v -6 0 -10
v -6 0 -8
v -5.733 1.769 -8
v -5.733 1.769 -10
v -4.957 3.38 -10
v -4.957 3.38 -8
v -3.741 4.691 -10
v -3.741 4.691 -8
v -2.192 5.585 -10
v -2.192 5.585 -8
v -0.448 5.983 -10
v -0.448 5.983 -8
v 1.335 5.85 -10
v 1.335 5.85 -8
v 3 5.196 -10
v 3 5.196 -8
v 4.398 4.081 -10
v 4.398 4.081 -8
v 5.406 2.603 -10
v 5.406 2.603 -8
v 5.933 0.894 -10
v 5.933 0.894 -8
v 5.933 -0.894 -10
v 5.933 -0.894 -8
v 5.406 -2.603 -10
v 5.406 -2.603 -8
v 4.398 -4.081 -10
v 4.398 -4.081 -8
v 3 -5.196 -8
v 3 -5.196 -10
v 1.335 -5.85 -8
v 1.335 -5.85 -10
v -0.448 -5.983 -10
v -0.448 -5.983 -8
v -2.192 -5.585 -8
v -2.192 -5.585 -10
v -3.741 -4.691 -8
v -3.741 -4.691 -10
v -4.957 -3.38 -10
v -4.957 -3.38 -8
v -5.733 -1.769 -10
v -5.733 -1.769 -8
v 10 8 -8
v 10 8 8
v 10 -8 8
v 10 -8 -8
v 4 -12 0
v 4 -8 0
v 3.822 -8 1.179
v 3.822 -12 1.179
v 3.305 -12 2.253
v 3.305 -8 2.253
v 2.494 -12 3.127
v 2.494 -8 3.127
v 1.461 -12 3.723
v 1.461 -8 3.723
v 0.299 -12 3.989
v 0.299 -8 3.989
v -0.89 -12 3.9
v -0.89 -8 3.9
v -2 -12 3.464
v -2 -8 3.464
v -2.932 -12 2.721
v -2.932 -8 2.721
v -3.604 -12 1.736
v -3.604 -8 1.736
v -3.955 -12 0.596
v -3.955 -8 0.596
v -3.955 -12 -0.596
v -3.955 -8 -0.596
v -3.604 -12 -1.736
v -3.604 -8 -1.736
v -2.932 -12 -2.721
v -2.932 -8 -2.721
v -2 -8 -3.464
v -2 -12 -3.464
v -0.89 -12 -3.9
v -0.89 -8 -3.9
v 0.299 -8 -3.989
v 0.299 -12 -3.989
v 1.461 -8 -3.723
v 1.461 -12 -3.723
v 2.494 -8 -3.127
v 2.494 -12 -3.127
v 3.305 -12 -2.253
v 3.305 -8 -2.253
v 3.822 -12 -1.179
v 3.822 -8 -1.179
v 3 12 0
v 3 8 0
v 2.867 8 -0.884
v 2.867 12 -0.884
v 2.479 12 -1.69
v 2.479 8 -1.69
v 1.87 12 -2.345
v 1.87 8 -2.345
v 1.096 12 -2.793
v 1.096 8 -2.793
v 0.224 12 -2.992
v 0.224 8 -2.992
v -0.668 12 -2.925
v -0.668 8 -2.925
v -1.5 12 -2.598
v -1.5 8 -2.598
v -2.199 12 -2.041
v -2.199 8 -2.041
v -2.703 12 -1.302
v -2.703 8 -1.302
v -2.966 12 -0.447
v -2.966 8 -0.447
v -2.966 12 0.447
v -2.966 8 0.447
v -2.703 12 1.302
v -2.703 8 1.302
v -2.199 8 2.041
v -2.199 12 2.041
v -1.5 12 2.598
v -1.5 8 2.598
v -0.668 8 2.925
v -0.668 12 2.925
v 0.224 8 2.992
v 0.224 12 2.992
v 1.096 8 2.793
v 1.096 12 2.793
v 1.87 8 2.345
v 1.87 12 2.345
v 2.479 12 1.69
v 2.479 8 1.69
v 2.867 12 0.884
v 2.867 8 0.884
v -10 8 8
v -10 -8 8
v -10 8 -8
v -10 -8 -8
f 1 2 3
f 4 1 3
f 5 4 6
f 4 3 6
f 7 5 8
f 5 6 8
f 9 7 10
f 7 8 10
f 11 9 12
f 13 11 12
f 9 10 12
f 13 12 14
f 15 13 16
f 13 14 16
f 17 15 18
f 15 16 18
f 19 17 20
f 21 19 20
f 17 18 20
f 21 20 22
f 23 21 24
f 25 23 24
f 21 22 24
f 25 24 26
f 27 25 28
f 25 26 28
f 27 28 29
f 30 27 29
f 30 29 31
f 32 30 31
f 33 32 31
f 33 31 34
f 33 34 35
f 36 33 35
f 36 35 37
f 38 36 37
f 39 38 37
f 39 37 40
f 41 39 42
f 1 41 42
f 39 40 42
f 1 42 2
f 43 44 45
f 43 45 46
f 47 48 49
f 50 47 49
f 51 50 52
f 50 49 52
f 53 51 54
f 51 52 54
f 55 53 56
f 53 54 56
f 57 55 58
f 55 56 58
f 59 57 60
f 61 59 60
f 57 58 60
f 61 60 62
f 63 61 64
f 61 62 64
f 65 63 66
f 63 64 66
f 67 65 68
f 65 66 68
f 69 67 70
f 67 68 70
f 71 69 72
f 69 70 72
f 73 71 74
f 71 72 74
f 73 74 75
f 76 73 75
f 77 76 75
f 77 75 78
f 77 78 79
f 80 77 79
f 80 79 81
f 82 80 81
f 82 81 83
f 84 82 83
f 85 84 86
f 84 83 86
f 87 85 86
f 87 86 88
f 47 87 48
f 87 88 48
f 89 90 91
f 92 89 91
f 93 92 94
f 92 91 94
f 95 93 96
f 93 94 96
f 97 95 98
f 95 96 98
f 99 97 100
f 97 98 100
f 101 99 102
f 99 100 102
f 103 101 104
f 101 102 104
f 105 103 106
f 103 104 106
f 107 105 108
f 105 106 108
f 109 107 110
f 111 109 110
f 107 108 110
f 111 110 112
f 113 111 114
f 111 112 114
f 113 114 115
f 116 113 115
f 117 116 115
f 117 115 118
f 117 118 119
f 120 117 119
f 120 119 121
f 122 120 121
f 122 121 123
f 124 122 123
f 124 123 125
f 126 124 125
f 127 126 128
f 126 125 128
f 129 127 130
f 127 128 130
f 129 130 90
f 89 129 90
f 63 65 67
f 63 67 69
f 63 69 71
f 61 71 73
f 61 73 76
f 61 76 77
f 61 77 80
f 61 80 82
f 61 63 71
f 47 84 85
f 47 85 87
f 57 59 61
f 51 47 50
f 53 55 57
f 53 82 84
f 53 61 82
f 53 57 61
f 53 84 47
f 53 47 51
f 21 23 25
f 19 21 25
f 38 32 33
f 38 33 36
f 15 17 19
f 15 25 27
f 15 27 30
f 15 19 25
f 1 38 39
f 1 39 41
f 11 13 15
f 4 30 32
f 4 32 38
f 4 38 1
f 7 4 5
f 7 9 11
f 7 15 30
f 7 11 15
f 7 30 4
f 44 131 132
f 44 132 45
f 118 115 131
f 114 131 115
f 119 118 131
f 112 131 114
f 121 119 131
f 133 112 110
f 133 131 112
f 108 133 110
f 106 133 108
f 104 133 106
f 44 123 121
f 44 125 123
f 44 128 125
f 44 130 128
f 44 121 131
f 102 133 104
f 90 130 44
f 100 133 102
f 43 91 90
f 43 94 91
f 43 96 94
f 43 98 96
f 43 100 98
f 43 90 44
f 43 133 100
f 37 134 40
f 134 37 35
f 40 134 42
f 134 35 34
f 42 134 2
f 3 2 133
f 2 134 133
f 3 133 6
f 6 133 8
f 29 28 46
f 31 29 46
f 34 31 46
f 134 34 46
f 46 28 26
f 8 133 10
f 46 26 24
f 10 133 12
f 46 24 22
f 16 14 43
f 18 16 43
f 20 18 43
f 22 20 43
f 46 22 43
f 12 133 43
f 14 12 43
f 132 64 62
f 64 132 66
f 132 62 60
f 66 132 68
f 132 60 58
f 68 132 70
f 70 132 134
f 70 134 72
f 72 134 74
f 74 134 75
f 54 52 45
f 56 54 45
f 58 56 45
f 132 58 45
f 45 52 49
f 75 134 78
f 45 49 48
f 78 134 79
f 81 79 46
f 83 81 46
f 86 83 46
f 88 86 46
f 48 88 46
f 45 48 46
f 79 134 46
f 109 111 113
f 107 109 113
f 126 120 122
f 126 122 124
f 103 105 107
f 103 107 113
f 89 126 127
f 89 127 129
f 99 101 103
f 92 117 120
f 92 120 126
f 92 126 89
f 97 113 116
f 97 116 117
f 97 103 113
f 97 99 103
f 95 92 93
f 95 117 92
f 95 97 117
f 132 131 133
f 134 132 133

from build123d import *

# Parameters (mm, degrees)
SKETCH_1_W      = 20
SKETCH_1_H      = 16
EXTRUDE_1_DEPTH = 8
SKETCH_2_R      = 6
EXTRUDE_2_DEPTH = 2
SKETCH_3_R      = 4
EXTRUDE_3_DEPTH = 4
SKETCH_4_R      = 3
EXTRUDE_4_DEPTH = 4


with BuildPart() as part:
    # 草图1 → 凸台-拉伸1 (new body, symmetric)
    with BuildSketch(Plane(origin=(0, 0, 0), x_dir=(1, 0, 0), z_dir=(0, 1, 0))):
        Rectangle(SKETCH_1_W, SKETCH_1_H)
    extrude(amount=EXTRUDE_1_DEPTH, both=True)

    # 草图2 → 凸台-拉伸2 (add)
    with BuildSketch(Plane(origin=(0, 0, -8), x_dir=(-1, 0, 0), z_dir=(0, 0, -1))):
        Circle(SKETCH_2_R)
    extrude(amount=EXTRUDE_2_DEPTH)

    # 草图3 → 凸台-拉伸3 (add)
    with BuildSketch(Plane.XZ.offset(8)):
        Circle(SKETCH_3_R)
    extrude(amount=EXTRUDE_3_DEPTH)

    # 草图4 → 凸台-拉伸4 (add)
    with BuildSketch(Plane(origin=(0, 8, 0), x_dir=(1, 0, 0), z_dir=(0, 1, 0))):
        Circle(SKETCH_4_R)
    extrude(amount=EXTRUDE_4_DEPTH)


solid = part.part
